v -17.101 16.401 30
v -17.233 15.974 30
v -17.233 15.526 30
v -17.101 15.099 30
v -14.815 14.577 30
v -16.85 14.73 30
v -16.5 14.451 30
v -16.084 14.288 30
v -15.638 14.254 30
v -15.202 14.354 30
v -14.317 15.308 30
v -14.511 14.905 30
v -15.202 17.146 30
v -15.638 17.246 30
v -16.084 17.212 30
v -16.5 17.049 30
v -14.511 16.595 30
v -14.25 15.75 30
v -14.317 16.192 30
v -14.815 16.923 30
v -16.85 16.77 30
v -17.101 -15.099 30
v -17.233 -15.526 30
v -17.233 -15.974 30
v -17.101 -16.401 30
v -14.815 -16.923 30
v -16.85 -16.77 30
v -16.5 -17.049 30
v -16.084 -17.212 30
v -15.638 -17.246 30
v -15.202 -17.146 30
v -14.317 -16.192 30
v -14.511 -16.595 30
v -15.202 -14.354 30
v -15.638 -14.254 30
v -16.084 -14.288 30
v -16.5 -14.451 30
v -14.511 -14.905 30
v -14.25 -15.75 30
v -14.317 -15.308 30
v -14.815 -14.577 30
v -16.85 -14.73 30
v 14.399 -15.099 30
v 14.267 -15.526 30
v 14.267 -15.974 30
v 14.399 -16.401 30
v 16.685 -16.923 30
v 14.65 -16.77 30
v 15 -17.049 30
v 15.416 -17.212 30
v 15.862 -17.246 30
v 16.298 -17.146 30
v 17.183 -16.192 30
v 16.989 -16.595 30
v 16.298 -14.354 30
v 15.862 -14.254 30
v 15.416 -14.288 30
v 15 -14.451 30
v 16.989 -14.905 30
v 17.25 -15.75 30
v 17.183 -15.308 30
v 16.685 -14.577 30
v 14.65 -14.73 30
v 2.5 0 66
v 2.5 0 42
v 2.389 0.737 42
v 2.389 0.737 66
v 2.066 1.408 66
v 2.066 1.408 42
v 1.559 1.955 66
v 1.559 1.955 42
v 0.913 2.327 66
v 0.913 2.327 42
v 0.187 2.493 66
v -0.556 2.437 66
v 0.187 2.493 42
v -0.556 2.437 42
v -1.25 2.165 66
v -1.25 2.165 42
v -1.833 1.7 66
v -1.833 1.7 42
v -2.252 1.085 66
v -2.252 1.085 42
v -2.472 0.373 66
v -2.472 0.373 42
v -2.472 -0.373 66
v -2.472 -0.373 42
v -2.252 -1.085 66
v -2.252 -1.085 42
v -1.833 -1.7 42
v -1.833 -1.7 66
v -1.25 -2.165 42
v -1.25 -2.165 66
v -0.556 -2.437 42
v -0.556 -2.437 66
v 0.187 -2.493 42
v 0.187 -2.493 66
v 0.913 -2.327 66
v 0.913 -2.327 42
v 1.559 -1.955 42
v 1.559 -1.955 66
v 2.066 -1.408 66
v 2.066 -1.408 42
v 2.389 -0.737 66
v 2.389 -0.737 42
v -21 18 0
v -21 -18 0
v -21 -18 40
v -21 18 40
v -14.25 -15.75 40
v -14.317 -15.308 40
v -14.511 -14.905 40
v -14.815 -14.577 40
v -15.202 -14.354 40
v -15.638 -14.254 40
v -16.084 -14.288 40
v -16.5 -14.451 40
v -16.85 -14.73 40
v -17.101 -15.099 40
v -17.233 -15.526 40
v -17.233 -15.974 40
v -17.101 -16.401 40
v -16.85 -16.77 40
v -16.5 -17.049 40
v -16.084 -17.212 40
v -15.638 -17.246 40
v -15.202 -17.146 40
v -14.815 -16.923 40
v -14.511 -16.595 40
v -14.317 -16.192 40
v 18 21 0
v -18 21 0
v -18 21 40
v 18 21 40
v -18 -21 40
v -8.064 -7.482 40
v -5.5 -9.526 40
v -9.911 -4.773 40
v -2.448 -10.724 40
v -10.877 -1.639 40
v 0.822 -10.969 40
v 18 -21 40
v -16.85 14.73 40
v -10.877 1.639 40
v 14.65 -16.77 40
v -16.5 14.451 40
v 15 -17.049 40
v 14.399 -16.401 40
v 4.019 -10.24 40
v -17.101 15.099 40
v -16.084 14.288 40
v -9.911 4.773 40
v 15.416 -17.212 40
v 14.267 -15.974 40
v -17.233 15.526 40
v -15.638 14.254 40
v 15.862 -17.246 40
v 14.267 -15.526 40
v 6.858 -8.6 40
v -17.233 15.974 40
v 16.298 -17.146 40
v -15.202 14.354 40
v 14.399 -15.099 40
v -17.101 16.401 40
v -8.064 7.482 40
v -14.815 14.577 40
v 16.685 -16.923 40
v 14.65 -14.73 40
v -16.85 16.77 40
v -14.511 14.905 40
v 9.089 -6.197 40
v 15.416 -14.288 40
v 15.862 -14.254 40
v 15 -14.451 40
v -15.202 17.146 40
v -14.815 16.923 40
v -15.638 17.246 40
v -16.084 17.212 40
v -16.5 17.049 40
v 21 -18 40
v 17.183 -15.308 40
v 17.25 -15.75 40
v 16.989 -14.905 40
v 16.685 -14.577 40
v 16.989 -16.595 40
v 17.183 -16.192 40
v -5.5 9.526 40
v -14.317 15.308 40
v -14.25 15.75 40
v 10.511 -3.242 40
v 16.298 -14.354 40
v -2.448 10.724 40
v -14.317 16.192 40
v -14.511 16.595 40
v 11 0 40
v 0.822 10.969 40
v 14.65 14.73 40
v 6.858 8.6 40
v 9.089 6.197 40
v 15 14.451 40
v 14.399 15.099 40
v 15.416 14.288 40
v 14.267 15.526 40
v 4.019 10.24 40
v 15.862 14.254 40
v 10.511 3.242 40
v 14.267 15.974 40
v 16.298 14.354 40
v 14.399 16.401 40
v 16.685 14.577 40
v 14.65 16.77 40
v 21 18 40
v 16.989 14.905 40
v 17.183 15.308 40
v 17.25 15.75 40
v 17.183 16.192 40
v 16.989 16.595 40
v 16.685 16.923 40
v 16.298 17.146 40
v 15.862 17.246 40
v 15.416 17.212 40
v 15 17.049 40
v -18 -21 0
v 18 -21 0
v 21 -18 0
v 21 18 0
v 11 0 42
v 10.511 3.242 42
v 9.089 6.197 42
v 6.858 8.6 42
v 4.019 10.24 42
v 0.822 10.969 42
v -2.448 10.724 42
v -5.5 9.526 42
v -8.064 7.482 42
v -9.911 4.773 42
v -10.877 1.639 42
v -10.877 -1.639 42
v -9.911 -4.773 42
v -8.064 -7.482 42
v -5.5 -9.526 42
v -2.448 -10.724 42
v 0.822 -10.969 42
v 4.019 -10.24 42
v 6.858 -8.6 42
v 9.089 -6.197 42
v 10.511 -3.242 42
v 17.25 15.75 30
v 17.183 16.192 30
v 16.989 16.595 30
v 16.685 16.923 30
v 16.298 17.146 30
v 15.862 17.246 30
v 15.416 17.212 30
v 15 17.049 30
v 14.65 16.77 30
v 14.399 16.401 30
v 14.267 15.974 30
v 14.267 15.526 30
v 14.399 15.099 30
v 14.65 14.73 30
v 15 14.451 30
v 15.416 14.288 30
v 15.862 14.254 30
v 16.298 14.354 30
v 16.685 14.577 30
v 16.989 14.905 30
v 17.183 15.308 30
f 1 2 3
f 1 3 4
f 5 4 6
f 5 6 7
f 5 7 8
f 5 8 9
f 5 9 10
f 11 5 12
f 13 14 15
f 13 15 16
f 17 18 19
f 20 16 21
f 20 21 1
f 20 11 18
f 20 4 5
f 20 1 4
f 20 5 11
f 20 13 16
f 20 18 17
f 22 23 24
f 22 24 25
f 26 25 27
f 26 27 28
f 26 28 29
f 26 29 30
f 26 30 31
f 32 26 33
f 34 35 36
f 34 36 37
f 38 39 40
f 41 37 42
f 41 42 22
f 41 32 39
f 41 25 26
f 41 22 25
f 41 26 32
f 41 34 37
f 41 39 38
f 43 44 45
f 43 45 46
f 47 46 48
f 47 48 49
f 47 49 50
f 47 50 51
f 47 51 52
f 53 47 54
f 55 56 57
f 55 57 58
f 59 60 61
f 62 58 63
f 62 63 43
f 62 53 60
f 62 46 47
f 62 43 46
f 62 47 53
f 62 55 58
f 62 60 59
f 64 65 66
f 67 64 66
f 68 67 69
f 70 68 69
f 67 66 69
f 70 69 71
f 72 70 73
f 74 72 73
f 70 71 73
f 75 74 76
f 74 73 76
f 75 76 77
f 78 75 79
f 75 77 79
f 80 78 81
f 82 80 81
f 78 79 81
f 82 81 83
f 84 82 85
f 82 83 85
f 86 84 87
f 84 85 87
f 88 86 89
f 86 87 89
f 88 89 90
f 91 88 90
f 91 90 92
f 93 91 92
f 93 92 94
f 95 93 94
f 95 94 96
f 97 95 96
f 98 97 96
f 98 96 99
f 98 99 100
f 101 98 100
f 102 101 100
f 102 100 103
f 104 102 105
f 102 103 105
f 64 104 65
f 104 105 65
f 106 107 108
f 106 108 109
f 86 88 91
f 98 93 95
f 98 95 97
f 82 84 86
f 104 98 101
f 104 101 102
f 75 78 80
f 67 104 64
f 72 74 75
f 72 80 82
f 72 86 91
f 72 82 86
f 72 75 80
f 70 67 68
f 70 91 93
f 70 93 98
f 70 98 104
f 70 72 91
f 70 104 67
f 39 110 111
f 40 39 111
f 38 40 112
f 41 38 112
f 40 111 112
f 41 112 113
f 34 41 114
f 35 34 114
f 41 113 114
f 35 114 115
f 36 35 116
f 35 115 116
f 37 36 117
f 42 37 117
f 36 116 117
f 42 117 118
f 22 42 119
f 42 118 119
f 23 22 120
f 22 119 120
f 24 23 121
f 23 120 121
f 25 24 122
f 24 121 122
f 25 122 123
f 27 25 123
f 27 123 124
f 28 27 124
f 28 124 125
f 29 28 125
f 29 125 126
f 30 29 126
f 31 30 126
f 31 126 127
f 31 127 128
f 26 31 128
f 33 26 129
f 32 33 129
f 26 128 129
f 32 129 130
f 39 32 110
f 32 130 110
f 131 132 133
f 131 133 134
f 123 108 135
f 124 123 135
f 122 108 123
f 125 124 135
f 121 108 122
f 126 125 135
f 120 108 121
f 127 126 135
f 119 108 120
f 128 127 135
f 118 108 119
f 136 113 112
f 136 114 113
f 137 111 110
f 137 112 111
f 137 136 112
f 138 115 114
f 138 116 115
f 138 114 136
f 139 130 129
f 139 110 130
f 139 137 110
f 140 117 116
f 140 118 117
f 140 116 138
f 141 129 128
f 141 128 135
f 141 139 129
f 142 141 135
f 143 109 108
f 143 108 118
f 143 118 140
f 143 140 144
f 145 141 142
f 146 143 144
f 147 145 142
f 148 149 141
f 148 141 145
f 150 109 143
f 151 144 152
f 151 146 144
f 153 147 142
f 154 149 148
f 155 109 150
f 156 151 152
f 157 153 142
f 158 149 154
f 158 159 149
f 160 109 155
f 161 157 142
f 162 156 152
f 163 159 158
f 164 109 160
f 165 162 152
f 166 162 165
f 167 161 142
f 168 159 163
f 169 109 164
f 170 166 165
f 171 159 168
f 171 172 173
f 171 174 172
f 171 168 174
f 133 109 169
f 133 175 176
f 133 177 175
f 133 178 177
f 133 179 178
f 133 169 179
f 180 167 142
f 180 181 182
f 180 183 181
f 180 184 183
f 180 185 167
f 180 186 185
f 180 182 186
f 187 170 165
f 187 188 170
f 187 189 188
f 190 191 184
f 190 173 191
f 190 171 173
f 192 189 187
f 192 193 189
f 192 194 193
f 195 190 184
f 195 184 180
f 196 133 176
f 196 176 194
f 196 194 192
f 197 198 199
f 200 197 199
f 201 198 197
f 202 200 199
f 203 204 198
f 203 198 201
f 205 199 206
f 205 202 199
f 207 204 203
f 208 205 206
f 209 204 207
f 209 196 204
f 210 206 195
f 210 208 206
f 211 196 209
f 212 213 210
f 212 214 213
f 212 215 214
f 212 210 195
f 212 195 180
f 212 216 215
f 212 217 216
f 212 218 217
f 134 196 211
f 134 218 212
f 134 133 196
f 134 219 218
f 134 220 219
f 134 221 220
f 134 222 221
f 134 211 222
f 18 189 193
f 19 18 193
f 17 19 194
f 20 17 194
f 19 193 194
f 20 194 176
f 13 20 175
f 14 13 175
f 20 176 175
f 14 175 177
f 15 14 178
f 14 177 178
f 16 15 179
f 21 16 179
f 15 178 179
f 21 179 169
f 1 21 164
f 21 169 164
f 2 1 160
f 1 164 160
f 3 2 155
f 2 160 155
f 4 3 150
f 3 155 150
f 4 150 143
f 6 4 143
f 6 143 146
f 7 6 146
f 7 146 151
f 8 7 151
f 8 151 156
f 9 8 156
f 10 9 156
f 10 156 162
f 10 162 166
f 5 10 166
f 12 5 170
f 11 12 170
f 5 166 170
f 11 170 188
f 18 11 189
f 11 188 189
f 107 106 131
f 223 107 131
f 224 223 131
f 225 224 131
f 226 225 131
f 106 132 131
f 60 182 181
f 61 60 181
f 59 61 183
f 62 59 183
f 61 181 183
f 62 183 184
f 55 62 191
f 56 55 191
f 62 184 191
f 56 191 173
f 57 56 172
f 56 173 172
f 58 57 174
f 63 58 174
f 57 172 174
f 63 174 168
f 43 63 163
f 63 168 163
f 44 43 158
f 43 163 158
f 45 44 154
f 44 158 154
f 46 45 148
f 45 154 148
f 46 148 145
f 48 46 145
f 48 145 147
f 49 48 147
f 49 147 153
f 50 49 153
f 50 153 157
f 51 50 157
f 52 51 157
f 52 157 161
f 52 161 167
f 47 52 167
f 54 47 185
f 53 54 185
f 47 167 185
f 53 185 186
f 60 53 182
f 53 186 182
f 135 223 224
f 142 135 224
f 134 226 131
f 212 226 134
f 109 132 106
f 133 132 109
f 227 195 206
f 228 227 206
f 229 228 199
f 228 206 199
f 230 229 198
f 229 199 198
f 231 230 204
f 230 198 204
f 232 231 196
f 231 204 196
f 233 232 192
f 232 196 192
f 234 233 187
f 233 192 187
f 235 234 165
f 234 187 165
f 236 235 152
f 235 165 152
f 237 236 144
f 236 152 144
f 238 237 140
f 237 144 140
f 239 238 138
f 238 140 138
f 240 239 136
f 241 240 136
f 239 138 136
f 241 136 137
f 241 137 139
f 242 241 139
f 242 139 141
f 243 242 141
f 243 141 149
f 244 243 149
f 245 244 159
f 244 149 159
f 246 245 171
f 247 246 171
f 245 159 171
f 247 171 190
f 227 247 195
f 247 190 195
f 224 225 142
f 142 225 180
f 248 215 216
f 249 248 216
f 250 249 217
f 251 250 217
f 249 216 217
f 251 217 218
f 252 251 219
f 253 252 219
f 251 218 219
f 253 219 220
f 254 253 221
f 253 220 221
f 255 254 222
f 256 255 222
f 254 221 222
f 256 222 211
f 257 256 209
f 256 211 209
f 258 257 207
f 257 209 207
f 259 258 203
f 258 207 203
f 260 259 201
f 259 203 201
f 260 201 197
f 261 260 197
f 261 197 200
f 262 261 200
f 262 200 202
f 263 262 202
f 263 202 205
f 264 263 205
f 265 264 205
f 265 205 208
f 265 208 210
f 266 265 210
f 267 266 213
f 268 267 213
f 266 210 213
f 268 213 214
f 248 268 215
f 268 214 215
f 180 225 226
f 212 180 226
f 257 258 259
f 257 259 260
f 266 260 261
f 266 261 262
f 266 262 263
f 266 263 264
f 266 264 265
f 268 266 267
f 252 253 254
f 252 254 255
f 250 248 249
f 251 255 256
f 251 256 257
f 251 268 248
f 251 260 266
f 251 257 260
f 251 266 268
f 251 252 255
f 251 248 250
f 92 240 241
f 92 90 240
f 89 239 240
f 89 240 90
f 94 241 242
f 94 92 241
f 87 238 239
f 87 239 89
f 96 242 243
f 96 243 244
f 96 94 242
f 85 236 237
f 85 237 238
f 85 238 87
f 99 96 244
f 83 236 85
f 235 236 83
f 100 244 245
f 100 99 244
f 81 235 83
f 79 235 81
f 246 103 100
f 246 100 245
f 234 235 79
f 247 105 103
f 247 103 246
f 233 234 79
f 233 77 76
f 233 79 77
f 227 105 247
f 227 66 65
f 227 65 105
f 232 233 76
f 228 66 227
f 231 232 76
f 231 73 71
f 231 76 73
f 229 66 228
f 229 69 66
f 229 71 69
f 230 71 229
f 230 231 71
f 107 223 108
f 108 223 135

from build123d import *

# Parameters (mm, degrees)
SKETCH1_W           = 42
SKETCH1_H           = 42
BOSS_EXTRUDE1_DEPTH = 40
SKETCH2_R           = 11
BOSS_EXTRUDE2_DEPTH = 2
SKETCH3_R           = 2.5
BOSS_EXTRUDE3_DEPTH = 24
CHAMFER1_SIZE       = 3
SKETCH4_R           = 1.5
CUT_EXTRUDE1_DEPTH  = 10


with BuildPart() as part:
    # Sketch1 → Boss-Extrude1 (new body)
    with BuildSketch(Plane.XY):
        Rectangle(SKETCH1_W, SKETCH1_H)
    extrude(amount=BOSS_EXTRUDE1_DEPTH)

    # Sketch2 → Boss-Extrude2 (add)
    with BuildSketch(Plane.XY.offset(40)):
        Circle(SKETCH2_R)
    extrude(amount=BOSS_EXTRUDE2_DEPTH)

    # Sketch3 → Boss-Extrude3 (add)
    with BuildSketch(Plane.XY.offset(42)):
        Circle(SKETCH3_R)
    extrude(amount=BOSS_EXTRUDE3_DEPTH)

    # Chamfer1
    chamfer1_edges = [part.edges().sort_by_distance(p)[0] for p in [
        (21, -21, 20),
        (-21, -21, 20),
        (-21, 21, 20),
        (21, 21, 20),
    ]]
    chamfer(chamfer1_edges, length=CHAMFER1_SIZE)

    # Sketch4 → Cut-Extrude1 (cut)
    with BuildSketch(Plane.XY.offset(40)):
        with Locations((-15.75, 15.75)):
            Circle(SKETCH4_R)
        with Locations((15.75, 15.75)):
            Circle(SKETCH4_R)
        with Locations((-15.75, -15.75)):
            Circle(SKETCH4_R)
        with Locations((15.75, -15.75)):
            Circle(SKETCH4_R)
    extrude(amount=-CUT_EXTRUDE1_DEPTH, mode=Mode.SUBTRACT)


solid = part.part
